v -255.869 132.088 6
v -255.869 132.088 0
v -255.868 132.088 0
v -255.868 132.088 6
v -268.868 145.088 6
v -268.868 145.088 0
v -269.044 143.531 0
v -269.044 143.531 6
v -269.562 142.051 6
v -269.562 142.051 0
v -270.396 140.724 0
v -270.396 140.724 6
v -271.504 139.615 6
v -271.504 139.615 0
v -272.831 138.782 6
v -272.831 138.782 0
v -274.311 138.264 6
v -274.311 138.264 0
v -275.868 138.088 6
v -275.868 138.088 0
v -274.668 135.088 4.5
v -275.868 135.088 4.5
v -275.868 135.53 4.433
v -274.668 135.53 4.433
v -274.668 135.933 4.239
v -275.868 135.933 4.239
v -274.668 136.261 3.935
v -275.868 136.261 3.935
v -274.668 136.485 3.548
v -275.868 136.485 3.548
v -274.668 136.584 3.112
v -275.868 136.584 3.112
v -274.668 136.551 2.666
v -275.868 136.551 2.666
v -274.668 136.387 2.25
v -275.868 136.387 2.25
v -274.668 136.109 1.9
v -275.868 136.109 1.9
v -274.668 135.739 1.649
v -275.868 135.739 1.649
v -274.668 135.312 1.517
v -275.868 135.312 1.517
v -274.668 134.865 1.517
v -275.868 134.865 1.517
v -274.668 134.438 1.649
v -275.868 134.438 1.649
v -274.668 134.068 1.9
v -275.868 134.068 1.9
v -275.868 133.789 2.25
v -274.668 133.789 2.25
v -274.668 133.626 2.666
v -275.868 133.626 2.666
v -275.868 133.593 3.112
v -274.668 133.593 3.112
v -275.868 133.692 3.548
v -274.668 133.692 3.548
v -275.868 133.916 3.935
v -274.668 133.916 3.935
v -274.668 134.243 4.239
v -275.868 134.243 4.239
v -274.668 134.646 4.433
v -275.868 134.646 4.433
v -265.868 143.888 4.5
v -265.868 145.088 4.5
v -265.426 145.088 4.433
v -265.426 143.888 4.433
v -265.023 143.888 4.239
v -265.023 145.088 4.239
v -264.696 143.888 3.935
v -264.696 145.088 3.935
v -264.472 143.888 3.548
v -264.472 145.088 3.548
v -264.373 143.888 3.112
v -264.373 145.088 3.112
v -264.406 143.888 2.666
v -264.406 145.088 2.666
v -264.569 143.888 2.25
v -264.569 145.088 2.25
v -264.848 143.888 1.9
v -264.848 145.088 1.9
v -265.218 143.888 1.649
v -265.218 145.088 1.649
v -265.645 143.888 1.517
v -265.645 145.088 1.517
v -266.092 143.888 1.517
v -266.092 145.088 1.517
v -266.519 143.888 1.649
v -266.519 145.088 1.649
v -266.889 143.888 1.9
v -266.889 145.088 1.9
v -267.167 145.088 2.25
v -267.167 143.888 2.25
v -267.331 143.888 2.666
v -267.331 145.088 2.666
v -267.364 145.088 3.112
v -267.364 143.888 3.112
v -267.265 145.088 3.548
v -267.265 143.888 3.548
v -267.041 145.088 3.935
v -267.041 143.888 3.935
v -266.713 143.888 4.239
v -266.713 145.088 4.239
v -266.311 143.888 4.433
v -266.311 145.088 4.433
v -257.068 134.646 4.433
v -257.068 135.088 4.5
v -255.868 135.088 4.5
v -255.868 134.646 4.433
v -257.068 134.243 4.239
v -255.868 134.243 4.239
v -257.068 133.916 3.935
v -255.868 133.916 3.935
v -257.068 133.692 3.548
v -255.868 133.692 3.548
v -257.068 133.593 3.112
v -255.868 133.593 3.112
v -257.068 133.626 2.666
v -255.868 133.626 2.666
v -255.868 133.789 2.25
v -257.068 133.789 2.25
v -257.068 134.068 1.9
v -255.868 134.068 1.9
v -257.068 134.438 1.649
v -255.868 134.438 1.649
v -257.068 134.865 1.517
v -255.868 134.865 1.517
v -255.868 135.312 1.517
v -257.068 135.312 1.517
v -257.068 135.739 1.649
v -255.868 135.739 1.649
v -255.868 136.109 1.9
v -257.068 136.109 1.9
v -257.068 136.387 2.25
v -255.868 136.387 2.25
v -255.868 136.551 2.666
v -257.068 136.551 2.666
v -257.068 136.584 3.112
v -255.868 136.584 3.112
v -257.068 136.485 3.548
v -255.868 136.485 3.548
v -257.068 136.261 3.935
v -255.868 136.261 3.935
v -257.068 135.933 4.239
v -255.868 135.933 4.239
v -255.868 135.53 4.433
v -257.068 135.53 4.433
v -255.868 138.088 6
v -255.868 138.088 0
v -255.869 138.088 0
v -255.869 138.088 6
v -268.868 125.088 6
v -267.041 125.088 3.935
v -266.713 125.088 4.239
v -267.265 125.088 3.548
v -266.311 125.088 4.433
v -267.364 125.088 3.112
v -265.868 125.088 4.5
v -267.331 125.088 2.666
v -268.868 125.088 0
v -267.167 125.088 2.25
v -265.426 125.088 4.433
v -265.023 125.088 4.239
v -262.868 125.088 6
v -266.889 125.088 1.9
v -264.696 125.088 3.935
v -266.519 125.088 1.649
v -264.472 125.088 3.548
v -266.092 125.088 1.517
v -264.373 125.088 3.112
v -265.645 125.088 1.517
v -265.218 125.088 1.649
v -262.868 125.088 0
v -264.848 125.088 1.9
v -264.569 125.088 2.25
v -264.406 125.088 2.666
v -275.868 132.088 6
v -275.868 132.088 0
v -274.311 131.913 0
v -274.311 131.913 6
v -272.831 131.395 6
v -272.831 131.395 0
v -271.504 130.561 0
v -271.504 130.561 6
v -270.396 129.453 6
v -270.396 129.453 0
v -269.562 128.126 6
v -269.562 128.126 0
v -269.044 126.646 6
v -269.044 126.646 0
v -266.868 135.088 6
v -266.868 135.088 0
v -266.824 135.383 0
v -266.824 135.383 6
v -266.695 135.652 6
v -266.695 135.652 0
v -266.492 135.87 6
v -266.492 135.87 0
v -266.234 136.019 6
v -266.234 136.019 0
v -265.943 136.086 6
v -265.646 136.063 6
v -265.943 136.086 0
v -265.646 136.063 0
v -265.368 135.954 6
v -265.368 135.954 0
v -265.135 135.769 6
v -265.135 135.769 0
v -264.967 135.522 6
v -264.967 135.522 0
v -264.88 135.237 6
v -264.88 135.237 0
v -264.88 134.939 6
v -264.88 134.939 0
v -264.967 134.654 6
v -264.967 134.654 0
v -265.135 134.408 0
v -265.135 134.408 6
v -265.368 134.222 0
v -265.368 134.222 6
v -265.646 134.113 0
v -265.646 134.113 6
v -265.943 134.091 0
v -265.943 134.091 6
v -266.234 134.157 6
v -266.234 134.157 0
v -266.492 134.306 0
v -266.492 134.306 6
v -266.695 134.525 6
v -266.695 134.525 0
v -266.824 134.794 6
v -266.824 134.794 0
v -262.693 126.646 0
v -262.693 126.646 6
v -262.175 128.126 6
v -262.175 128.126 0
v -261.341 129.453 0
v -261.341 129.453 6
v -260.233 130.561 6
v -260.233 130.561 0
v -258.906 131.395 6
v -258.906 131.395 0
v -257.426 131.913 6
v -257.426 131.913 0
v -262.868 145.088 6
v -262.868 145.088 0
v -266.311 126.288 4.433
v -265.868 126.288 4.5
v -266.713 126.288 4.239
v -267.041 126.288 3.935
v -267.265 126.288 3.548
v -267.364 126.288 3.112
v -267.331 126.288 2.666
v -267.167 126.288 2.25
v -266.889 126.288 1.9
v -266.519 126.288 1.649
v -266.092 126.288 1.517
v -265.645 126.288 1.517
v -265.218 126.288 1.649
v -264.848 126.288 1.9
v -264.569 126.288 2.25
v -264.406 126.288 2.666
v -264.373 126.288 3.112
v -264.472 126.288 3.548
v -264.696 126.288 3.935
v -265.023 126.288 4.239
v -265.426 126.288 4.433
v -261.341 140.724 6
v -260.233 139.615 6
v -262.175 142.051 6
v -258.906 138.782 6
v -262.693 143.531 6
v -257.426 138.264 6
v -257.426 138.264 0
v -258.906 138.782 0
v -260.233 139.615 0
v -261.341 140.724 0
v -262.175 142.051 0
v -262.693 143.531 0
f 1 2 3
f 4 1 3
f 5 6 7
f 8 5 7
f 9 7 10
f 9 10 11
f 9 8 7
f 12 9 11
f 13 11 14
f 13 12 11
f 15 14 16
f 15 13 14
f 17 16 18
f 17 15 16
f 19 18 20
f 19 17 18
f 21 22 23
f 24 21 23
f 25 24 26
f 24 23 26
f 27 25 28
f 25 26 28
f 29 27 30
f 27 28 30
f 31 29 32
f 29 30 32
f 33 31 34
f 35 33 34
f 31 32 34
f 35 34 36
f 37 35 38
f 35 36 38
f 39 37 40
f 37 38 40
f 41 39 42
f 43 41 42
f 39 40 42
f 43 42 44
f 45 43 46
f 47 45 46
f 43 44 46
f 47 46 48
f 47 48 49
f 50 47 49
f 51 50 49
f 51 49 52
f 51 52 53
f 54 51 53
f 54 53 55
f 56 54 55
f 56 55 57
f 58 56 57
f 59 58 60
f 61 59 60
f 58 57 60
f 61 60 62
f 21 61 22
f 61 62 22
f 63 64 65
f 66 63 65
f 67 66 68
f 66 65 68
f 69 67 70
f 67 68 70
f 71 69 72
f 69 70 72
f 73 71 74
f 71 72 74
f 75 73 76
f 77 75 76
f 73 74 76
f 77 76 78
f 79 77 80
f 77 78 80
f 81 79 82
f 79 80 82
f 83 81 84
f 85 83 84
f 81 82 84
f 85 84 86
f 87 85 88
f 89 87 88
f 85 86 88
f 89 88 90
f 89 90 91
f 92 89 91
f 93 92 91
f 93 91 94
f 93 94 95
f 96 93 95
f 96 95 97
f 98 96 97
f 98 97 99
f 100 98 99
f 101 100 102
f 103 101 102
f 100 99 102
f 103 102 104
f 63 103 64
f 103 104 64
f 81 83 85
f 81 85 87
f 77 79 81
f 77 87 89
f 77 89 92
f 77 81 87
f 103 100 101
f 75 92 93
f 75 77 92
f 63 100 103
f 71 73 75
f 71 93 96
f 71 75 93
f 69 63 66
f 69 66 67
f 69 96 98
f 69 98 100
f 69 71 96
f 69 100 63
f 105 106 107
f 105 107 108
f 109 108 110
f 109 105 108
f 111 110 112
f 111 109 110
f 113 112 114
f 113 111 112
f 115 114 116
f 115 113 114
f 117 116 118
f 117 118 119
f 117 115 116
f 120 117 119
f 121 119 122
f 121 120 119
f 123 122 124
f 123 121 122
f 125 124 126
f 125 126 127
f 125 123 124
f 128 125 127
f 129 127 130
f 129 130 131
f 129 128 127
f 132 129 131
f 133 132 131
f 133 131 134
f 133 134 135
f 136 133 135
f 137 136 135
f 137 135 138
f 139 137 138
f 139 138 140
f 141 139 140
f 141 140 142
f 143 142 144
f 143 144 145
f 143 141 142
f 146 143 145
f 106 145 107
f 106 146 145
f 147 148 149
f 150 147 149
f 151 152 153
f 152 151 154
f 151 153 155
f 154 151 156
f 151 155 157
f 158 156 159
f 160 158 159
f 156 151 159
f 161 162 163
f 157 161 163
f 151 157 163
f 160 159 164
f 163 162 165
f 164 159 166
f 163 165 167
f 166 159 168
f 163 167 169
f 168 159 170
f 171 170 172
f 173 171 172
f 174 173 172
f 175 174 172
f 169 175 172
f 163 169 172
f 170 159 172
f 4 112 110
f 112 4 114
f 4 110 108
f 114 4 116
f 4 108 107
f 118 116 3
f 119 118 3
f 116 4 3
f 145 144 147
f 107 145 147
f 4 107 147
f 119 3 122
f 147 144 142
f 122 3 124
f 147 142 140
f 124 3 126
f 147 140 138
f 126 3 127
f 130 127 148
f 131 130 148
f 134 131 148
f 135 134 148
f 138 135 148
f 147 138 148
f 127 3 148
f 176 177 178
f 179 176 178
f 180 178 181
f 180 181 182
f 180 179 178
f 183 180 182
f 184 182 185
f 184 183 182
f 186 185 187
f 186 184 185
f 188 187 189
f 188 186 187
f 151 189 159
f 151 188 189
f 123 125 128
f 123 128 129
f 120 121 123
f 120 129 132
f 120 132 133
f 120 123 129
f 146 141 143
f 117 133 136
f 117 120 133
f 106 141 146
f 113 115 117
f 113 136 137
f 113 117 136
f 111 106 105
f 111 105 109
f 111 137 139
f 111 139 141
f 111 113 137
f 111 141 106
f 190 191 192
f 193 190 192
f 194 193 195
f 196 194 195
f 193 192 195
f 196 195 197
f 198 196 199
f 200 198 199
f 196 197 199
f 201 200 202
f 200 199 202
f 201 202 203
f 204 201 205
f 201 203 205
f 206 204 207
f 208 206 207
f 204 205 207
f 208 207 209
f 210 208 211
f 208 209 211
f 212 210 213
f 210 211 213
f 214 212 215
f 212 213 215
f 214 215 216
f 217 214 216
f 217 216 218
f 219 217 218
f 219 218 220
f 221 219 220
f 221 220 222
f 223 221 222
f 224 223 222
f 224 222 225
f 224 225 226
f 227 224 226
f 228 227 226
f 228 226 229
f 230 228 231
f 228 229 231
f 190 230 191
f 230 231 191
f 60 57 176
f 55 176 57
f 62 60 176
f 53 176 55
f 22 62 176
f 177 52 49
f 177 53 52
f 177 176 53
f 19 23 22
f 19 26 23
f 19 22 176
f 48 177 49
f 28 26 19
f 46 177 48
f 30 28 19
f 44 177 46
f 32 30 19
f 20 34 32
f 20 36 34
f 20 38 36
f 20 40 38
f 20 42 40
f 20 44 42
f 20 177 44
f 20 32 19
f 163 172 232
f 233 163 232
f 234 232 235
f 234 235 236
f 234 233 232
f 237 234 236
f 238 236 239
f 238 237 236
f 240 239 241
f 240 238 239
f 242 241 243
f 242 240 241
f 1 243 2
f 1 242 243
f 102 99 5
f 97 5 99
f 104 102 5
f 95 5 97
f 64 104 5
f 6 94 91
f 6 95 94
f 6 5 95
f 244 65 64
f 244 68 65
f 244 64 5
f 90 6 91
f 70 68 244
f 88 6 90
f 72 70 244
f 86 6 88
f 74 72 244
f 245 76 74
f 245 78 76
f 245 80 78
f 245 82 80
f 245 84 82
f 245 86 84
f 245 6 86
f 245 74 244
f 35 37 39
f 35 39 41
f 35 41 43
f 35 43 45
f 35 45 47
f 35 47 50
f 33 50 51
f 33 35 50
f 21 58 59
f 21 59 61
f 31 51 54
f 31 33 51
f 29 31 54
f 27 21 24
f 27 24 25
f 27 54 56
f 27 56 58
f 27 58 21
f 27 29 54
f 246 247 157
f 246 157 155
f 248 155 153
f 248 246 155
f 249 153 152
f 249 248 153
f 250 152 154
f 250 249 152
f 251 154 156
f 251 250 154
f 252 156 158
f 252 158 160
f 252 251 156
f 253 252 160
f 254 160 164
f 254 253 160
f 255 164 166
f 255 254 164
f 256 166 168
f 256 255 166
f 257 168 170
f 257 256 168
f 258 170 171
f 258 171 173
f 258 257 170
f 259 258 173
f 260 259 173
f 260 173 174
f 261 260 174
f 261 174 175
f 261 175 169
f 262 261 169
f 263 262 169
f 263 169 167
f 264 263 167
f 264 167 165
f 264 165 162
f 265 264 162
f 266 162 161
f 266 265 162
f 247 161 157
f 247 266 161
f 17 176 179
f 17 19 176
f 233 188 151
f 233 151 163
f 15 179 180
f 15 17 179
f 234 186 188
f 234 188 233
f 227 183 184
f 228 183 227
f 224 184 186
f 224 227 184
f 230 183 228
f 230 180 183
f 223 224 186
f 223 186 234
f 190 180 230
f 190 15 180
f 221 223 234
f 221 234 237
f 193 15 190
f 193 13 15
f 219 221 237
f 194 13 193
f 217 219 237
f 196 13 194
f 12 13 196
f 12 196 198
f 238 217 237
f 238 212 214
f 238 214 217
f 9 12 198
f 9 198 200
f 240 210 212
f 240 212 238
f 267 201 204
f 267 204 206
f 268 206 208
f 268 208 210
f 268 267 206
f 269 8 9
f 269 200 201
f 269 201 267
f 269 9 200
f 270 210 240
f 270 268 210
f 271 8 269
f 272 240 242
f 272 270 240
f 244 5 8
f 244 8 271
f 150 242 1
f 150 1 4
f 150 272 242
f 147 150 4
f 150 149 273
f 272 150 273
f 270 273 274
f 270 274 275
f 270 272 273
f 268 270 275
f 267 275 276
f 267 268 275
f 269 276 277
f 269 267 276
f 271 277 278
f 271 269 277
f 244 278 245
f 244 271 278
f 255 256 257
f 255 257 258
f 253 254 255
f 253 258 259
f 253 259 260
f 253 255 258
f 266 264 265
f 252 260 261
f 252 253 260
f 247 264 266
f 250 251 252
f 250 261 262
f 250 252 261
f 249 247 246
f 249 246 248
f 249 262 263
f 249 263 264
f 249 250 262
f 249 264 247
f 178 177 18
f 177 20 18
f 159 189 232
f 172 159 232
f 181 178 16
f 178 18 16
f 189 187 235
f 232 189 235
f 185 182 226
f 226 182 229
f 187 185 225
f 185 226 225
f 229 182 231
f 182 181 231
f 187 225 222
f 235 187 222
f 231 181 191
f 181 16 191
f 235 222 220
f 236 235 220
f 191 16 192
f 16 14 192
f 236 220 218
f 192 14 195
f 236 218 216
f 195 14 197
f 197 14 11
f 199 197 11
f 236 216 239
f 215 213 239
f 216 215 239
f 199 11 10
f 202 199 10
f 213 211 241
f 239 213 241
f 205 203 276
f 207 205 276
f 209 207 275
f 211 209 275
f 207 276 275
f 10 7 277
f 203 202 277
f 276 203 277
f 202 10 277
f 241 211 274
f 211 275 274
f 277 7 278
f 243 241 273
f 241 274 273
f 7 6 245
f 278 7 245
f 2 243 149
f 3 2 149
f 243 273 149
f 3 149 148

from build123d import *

# Parameters (mm, degrees)
SKETCH10_W          = 7
SKETCH10_H          = 6
SKETCH10_W_2        = 6
SKETCH10_H_2        = 7
BOSS_EXTRUDE4_DEPTH = 6
SKETCH11_R          = 1.5
CUT_EXTRUDE3_DEPTH  = 1.2
SKETCH14_R          = 1.5
CUT_EXTRUDE4_DEPTH  = 1.2
CUT_EXTRUDE5_START  = -1.2
SKETCH15_R          = 1.5
CUT_EXTRUDE5_DEPTH  = 1.2
CUT_EXTRUDE7_START  = -1.2
SKETCH16_R          = 1.5
CUT_EXTRUDE7_DEPTH  = 1.2
FILLET1_R           = 7
FILLET2_R           = 7
FILLET3_R           = 7
FILLET4_R           = 7
SKETCH17_R          = 1
CUT_EXTRUDE8_DEPTH  = 6


with BuildPart() as part:
    # Sketch10 → Boss-Extrude4 (new body)
    with BuildSketch(Plane.XY):
        with Locations((-272.368433777, 135.088329622)):
            Rectangle(SKETCH10_W, SKETCH10_H)
        with Locations((-265.868433777, 128.588329622)):
            Rectangle(SKETCH10_W_2, SKETCH10_H_2)
        with Locations((-259.368433777, 135.088329622)):
            Rectangle(SKETCH10_W, SKETCH10_H)
        with Locations((-265.868433777, 135.088329622)):
            Rectangle(SKETCH10_W_2, SKETCH10_H)
        with Locations((-265.868433777, 141.588329622)):
            Rectangle(SKETCH10_W_2, SKETCH10_H_2)
    extrude(amount=BOSS_EXTRUDE4_DEPTH)

    # Sketch11 → Cut-Extrude3 (cut)
    with BuildSketch(Plane(origin=(0, 145.088329622, 0), x_dir=(1, 0, 0), z_dir=(0, 1, 0))):
        with Locations(Location((-265.868433777, -3, 0), (0, 0, 270))):
            Circle(SKETCH11_R)
    extrude(amount=-CUT_EXTRUDE3_DEPTH, mode=Mode.SUBTRACT)

    # Sketch14 → Cut-Extrude4 (cut)
    with BuildSketch(Plane.ZY.offset(275.868433777)):
        with Locations((3, 135.088329622)):
            Circle(SKETCH14_R)
    extrude(amount=-CUT_EXTRUDE4_DEPTH, mode=Mode.SUBTRACT)

    # Sketch15 → Cut-Extrude5 (cut)
    with BuildSketch(Plane(origin=(0, 125.088329622, 0), x_dir=(-1, 0, 0), z_dir=(0, -1, 0)).offset(CUT_EXTRUDE5_START)):
        with Locations(Location((265.868433777, -3, 0), (0, 0, 270))):
            Circle(SKETCH15_R)
    extrude(amount=CUT_EXTRUDE5_DEPTH, mode=Mode.SUBTRACT)

    # Sketch16 → Cut-Extrude7 (cut)
    with BuildSketch(Plane(origin=(-255.868433777, 0, 0), x_dir=(0, 0, -1), z_dir=(1, 0, 0)).offset(CUT_EXTRUDE7_START)):
        with Locations(Location((-3, 135.088329622, 0), (0, 0, 180))):
            Circle(SKETCH16_R)
    extrude(amount=CUT_EXTRUDE7_DEPTH, mode=Mode.SUBTRACT)

    # Fillet1
    fillet1_edges = [part.edges().sort_by_distance(p)[0] for p in [
        (-262.868433777, 138.088329622, 3),
    ]]
    fillet(fillet1_edges, radius=FILLET1_R - 0.0001)  # a hair under: the kernel refuses the full size

    # Fillet2
    fillet2_edges = [part.edges().sort_by_distance(p)[0] for p in [
        (-268.868433777, 138.088329622, 3),
    ]]
    fillet(fillet2_edges, radius=FILLET2_R - 0.0001)  # a hair under: the kernel refuses the full size

    # Fillet3
    fillet3_edges = [part.edges().sort_by_distance(p)[0] for p in [
        (-268.868433777, 132.088329622, 3),
    ]]
    fillet(fillet3_edges, radius=FILLET3_R - 0.0001)  # a hair under: the kernel refuses the full size

    # Fillet4
    fillet4_edges = [part.edges().sort_by_distance(p)[0] for p in [
        (-262.868433777, 132.088329622, 3),
    ]]
    fillet(fillet4_edges, radius=FILLET4_R - 0.0001)  # a hair under: the kernel refuses the full size

    # Sketch17 → Cut-Extrude8 (cut)
    with BuildSketch(Plane(origin=(0, 0, 0), x_dir=(-1, 0, 0), z_dir=(0, 0, -1))):
        with Locations((265.868433777, 135.088329622)):
            Circle(SKETCH17_R)
    extrude(amount=-CUT_EXTRUDE8_DEPTH, mode=Mode.SUBTRACT)


solid = part.part
